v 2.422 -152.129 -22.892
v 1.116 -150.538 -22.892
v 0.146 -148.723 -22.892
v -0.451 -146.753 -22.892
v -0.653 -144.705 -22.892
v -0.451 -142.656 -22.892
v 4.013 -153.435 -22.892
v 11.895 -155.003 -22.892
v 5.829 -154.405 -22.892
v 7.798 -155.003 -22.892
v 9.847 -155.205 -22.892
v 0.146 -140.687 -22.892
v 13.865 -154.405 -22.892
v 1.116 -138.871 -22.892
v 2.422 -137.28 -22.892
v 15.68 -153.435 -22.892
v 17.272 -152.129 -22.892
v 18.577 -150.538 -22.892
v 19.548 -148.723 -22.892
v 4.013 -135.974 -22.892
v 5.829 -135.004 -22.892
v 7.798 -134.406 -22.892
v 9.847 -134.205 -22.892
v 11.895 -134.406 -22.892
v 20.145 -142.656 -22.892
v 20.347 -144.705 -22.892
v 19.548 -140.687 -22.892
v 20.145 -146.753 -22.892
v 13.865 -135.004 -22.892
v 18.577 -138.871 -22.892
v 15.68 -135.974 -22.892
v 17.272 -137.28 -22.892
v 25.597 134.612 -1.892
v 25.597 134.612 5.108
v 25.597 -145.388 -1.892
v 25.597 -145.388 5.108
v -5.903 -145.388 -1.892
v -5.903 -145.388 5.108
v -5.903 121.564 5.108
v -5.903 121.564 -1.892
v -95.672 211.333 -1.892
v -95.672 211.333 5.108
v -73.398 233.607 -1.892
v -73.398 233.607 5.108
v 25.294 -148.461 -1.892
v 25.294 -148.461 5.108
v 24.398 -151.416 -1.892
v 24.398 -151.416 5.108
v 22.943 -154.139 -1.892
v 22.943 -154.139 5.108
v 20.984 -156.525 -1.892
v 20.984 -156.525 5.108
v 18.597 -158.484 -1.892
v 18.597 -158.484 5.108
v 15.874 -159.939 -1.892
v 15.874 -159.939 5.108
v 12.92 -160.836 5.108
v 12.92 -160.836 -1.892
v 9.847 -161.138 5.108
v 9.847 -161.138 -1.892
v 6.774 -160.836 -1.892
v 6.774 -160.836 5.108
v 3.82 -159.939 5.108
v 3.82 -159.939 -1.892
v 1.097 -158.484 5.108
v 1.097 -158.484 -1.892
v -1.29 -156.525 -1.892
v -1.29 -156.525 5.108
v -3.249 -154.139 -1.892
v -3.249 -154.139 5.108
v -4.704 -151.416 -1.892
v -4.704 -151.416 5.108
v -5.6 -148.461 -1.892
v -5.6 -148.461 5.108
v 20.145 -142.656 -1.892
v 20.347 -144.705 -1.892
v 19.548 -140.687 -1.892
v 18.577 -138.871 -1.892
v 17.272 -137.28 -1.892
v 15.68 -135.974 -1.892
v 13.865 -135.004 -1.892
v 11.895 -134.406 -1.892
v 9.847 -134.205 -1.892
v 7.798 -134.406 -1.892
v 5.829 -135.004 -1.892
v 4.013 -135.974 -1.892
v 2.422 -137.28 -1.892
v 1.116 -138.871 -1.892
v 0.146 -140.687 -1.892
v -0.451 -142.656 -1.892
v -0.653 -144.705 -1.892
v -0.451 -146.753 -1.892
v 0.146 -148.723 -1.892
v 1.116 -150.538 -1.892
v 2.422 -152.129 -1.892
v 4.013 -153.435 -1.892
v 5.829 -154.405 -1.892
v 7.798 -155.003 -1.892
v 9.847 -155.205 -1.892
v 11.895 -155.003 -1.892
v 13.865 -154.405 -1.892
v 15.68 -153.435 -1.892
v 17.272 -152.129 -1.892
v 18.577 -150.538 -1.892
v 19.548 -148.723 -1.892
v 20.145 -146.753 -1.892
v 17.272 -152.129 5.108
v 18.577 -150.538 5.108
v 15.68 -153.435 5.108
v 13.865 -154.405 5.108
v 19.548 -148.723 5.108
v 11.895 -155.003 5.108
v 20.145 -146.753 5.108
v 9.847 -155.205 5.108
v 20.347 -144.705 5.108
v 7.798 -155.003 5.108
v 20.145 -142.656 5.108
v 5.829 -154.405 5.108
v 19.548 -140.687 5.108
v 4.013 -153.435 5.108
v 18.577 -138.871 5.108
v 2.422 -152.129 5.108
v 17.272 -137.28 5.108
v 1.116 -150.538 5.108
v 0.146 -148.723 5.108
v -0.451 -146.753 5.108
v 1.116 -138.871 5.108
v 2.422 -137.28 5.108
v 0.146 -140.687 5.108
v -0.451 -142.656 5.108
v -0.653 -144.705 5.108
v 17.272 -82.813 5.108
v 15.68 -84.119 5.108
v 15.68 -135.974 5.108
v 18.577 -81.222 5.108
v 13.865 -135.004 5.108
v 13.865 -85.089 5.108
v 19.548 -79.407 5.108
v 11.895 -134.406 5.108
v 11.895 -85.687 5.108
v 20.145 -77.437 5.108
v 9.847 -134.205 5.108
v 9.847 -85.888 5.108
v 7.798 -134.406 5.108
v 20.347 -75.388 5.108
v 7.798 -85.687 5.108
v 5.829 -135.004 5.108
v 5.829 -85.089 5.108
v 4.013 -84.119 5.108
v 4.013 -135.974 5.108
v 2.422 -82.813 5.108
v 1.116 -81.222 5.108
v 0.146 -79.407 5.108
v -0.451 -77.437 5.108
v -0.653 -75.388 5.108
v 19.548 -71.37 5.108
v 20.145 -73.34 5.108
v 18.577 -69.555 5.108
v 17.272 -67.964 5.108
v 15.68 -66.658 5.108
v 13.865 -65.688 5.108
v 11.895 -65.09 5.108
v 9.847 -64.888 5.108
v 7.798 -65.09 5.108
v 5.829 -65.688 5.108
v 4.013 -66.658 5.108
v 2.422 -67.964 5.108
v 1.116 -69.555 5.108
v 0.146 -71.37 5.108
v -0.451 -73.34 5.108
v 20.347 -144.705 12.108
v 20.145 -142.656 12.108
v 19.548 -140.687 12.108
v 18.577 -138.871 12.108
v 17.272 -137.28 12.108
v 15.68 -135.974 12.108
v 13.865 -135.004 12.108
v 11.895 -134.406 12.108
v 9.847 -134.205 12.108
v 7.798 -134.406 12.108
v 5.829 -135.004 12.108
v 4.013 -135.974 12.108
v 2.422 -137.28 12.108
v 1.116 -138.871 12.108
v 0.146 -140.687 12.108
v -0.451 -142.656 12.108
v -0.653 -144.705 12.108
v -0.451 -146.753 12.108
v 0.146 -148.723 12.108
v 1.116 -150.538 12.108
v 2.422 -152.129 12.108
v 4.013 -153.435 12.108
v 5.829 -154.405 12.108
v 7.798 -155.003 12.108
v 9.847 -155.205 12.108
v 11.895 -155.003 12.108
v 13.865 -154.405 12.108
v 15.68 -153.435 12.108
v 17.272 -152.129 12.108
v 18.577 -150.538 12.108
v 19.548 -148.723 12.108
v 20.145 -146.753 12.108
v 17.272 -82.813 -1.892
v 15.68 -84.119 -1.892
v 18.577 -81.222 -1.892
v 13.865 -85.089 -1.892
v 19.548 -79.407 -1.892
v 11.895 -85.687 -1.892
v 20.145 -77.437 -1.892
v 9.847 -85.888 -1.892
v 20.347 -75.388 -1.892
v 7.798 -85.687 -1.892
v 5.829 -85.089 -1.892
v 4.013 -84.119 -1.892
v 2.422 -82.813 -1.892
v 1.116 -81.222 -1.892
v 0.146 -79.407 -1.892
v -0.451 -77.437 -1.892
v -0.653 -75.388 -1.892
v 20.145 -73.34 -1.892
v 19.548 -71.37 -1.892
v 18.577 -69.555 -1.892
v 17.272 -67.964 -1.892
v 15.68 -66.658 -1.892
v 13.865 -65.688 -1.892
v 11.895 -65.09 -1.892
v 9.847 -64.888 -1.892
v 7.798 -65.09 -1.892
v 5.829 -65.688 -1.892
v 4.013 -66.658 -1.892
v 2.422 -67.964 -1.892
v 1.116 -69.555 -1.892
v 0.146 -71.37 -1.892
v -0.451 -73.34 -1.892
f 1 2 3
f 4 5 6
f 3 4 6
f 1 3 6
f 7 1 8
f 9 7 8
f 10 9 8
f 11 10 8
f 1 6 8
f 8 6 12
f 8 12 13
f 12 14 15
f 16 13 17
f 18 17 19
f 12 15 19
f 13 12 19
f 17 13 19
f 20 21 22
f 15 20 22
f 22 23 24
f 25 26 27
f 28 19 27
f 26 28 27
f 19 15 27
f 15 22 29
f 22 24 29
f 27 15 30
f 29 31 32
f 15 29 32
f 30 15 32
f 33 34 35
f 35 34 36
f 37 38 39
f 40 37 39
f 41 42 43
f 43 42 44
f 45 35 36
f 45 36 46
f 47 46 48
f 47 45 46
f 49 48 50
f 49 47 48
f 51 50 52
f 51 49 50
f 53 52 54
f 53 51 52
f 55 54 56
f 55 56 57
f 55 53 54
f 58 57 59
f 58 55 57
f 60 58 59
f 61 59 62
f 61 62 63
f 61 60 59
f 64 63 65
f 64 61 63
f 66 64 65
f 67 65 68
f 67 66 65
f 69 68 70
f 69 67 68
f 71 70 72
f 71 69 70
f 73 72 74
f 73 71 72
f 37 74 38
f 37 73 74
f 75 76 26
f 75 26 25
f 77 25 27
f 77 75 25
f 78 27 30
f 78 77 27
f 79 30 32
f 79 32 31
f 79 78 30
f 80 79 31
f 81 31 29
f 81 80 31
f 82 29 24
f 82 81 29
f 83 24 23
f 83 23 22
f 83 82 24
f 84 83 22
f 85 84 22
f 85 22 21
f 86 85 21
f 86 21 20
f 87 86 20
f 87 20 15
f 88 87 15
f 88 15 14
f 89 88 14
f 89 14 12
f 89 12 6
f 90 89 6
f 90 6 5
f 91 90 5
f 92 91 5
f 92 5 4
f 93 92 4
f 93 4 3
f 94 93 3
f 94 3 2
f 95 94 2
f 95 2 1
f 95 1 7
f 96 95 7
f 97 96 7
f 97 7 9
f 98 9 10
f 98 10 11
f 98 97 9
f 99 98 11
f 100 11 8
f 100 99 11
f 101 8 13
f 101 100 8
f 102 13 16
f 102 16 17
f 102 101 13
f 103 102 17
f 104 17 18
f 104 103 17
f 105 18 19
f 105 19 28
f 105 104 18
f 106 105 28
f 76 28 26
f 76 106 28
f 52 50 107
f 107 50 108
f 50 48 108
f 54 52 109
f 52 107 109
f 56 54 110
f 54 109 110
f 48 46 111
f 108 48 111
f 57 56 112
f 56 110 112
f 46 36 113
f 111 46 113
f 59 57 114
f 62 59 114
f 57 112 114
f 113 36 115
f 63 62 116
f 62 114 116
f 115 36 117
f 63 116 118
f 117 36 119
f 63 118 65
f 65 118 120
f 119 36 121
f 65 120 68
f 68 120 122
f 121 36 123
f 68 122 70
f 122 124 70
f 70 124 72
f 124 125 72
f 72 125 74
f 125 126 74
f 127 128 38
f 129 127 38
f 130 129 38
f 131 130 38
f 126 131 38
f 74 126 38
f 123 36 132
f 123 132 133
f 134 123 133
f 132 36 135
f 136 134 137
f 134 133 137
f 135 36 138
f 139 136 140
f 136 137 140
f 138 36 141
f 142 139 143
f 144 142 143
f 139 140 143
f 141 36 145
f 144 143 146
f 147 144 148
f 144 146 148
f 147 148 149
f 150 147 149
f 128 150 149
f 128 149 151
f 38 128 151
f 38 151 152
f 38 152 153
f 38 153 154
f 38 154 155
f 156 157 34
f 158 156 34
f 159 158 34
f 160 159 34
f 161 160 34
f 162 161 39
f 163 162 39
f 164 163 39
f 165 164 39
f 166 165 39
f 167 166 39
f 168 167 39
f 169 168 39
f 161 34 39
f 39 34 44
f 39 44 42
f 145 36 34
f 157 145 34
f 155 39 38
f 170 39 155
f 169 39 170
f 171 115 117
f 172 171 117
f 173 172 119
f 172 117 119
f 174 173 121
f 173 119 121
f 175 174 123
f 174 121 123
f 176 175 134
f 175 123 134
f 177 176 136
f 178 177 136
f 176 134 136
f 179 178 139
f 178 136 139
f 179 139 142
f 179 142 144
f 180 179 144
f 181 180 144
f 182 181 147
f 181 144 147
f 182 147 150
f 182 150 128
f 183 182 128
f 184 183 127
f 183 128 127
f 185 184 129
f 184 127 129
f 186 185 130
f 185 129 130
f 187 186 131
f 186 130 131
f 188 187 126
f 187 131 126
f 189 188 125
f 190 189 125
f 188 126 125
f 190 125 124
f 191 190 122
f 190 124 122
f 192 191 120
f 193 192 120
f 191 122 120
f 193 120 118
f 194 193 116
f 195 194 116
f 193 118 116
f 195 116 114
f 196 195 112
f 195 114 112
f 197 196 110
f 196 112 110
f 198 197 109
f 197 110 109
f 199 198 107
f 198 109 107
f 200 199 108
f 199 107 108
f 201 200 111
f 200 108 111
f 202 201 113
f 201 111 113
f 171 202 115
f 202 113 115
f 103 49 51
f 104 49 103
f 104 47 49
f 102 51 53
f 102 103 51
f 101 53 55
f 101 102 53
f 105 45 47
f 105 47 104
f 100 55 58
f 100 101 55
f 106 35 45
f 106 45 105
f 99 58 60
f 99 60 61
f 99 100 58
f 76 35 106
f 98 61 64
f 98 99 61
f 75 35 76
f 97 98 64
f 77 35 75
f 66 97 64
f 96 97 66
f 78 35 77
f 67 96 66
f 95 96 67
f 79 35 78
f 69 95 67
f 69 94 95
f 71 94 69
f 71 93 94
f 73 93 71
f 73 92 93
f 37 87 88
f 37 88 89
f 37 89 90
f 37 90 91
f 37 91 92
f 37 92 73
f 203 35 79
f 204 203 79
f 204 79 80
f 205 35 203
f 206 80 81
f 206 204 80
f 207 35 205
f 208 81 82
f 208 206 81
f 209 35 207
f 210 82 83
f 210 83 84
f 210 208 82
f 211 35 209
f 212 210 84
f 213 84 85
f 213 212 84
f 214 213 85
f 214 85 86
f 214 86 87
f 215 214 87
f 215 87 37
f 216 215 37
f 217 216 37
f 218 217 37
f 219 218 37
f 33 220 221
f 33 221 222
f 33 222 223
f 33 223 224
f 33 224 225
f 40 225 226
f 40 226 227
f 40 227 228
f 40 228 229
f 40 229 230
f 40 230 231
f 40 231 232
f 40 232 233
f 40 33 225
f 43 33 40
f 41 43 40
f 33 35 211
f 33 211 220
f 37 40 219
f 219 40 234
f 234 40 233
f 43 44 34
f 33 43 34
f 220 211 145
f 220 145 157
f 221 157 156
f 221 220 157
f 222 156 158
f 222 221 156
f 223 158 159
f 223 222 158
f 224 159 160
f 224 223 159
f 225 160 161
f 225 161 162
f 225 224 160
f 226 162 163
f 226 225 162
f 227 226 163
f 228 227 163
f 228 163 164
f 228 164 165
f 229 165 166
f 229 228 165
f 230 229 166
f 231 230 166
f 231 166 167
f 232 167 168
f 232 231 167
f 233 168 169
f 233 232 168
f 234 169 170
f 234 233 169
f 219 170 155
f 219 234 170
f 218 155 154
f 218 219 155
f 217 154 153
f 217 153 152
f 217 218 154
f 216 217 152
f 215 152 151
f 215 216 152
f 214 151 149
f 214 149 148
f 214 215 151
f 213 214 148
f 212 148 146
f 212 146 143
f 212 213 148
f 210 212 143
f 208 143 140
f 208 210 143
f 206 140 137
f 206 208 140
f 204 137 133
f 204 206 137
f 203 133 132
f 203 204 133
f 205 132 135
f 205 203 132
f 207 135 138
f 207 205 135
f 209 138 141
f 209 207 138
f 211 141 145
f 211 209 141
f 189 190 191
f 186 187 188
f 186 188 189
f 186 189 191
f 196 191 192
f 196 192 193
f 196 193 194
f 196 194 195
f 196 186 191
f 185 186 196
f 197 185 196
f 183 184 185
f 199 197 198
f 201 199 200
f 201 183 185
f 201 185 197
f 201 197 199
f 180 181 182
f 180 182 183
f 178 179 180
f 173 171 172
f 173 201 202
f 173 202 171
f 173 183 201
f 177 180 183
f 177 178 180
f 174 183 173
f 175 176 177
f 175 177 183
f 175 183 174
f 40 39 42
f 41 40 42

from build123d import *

# Parameters (mm, degrees)
SKETCH_1_R           = 3
EXTRUDE_1_DEPTH      = 2
SKETCH_2_R           = 3
EXTRUDE_2_DEPTH      = 2
EXTRUDE_2_DEPTH_BACK = 8
EXTRUDE_4_DEPTH      = 2
SCALE_1_SCALE        = 3.5


with BuildPart() as part:
    # 草图1 → 凸台-拉伸1 (new body)
    with BuildSketch(Plane.XY):
        with BuildLine():
            Line((-4.5, -20), (-4.5, 20))
            ThreePointArc((-4.5, 20), (0, 24.5), (4.5, 20))
            Line((4.5, 20), (4.5, -20))
            ThreePointArc((4.5, -20), (0, -24.5), (-4.5, -20))
        make_face()
        Circle(SKETCH_1_R, mode=Mode.SUBTRACT)
    extrude(amount=EXTRUDE_1_DEPTH)

    # 草图2 → 凸台-拉伸2 (add, two sides)
    with BuildSketch(Plane.XY.offset(2)) as extrude_2_sk:
        with Locations((0, -19.804668681)):
            Circle(SKETCH_2_R)
    extrude(amount=EXTRUDE_2_DEPTH)
    extrude(extrude_2_sk.sketch, amount=-EXTRUDE_2_DEPTH_BACK)

    # 草图3 → 凸台-拉伸4 (add)
    with BuildSketch(Plane.XY.offset(2)):
        Polygon((-4.5, 20), (-4.5, 56.272077939), (-30.148232278, 81.920310217), (-23.784271247, 88.284271247), (4.5, 60), (4.5, 20), align=None)
    extrude(amount=-EXTRUDE_4_DEPTH)


with BuildPart() as part_1:
    # 缩放比例1: scaled about (-3.938760867, 30.155336672, 0.75690128)
    add(part.part.scale(SCALE_1_SCALE).moved(Location((9.846902167, -75.38834168, -1.8922532))))


solid = part_1.part
